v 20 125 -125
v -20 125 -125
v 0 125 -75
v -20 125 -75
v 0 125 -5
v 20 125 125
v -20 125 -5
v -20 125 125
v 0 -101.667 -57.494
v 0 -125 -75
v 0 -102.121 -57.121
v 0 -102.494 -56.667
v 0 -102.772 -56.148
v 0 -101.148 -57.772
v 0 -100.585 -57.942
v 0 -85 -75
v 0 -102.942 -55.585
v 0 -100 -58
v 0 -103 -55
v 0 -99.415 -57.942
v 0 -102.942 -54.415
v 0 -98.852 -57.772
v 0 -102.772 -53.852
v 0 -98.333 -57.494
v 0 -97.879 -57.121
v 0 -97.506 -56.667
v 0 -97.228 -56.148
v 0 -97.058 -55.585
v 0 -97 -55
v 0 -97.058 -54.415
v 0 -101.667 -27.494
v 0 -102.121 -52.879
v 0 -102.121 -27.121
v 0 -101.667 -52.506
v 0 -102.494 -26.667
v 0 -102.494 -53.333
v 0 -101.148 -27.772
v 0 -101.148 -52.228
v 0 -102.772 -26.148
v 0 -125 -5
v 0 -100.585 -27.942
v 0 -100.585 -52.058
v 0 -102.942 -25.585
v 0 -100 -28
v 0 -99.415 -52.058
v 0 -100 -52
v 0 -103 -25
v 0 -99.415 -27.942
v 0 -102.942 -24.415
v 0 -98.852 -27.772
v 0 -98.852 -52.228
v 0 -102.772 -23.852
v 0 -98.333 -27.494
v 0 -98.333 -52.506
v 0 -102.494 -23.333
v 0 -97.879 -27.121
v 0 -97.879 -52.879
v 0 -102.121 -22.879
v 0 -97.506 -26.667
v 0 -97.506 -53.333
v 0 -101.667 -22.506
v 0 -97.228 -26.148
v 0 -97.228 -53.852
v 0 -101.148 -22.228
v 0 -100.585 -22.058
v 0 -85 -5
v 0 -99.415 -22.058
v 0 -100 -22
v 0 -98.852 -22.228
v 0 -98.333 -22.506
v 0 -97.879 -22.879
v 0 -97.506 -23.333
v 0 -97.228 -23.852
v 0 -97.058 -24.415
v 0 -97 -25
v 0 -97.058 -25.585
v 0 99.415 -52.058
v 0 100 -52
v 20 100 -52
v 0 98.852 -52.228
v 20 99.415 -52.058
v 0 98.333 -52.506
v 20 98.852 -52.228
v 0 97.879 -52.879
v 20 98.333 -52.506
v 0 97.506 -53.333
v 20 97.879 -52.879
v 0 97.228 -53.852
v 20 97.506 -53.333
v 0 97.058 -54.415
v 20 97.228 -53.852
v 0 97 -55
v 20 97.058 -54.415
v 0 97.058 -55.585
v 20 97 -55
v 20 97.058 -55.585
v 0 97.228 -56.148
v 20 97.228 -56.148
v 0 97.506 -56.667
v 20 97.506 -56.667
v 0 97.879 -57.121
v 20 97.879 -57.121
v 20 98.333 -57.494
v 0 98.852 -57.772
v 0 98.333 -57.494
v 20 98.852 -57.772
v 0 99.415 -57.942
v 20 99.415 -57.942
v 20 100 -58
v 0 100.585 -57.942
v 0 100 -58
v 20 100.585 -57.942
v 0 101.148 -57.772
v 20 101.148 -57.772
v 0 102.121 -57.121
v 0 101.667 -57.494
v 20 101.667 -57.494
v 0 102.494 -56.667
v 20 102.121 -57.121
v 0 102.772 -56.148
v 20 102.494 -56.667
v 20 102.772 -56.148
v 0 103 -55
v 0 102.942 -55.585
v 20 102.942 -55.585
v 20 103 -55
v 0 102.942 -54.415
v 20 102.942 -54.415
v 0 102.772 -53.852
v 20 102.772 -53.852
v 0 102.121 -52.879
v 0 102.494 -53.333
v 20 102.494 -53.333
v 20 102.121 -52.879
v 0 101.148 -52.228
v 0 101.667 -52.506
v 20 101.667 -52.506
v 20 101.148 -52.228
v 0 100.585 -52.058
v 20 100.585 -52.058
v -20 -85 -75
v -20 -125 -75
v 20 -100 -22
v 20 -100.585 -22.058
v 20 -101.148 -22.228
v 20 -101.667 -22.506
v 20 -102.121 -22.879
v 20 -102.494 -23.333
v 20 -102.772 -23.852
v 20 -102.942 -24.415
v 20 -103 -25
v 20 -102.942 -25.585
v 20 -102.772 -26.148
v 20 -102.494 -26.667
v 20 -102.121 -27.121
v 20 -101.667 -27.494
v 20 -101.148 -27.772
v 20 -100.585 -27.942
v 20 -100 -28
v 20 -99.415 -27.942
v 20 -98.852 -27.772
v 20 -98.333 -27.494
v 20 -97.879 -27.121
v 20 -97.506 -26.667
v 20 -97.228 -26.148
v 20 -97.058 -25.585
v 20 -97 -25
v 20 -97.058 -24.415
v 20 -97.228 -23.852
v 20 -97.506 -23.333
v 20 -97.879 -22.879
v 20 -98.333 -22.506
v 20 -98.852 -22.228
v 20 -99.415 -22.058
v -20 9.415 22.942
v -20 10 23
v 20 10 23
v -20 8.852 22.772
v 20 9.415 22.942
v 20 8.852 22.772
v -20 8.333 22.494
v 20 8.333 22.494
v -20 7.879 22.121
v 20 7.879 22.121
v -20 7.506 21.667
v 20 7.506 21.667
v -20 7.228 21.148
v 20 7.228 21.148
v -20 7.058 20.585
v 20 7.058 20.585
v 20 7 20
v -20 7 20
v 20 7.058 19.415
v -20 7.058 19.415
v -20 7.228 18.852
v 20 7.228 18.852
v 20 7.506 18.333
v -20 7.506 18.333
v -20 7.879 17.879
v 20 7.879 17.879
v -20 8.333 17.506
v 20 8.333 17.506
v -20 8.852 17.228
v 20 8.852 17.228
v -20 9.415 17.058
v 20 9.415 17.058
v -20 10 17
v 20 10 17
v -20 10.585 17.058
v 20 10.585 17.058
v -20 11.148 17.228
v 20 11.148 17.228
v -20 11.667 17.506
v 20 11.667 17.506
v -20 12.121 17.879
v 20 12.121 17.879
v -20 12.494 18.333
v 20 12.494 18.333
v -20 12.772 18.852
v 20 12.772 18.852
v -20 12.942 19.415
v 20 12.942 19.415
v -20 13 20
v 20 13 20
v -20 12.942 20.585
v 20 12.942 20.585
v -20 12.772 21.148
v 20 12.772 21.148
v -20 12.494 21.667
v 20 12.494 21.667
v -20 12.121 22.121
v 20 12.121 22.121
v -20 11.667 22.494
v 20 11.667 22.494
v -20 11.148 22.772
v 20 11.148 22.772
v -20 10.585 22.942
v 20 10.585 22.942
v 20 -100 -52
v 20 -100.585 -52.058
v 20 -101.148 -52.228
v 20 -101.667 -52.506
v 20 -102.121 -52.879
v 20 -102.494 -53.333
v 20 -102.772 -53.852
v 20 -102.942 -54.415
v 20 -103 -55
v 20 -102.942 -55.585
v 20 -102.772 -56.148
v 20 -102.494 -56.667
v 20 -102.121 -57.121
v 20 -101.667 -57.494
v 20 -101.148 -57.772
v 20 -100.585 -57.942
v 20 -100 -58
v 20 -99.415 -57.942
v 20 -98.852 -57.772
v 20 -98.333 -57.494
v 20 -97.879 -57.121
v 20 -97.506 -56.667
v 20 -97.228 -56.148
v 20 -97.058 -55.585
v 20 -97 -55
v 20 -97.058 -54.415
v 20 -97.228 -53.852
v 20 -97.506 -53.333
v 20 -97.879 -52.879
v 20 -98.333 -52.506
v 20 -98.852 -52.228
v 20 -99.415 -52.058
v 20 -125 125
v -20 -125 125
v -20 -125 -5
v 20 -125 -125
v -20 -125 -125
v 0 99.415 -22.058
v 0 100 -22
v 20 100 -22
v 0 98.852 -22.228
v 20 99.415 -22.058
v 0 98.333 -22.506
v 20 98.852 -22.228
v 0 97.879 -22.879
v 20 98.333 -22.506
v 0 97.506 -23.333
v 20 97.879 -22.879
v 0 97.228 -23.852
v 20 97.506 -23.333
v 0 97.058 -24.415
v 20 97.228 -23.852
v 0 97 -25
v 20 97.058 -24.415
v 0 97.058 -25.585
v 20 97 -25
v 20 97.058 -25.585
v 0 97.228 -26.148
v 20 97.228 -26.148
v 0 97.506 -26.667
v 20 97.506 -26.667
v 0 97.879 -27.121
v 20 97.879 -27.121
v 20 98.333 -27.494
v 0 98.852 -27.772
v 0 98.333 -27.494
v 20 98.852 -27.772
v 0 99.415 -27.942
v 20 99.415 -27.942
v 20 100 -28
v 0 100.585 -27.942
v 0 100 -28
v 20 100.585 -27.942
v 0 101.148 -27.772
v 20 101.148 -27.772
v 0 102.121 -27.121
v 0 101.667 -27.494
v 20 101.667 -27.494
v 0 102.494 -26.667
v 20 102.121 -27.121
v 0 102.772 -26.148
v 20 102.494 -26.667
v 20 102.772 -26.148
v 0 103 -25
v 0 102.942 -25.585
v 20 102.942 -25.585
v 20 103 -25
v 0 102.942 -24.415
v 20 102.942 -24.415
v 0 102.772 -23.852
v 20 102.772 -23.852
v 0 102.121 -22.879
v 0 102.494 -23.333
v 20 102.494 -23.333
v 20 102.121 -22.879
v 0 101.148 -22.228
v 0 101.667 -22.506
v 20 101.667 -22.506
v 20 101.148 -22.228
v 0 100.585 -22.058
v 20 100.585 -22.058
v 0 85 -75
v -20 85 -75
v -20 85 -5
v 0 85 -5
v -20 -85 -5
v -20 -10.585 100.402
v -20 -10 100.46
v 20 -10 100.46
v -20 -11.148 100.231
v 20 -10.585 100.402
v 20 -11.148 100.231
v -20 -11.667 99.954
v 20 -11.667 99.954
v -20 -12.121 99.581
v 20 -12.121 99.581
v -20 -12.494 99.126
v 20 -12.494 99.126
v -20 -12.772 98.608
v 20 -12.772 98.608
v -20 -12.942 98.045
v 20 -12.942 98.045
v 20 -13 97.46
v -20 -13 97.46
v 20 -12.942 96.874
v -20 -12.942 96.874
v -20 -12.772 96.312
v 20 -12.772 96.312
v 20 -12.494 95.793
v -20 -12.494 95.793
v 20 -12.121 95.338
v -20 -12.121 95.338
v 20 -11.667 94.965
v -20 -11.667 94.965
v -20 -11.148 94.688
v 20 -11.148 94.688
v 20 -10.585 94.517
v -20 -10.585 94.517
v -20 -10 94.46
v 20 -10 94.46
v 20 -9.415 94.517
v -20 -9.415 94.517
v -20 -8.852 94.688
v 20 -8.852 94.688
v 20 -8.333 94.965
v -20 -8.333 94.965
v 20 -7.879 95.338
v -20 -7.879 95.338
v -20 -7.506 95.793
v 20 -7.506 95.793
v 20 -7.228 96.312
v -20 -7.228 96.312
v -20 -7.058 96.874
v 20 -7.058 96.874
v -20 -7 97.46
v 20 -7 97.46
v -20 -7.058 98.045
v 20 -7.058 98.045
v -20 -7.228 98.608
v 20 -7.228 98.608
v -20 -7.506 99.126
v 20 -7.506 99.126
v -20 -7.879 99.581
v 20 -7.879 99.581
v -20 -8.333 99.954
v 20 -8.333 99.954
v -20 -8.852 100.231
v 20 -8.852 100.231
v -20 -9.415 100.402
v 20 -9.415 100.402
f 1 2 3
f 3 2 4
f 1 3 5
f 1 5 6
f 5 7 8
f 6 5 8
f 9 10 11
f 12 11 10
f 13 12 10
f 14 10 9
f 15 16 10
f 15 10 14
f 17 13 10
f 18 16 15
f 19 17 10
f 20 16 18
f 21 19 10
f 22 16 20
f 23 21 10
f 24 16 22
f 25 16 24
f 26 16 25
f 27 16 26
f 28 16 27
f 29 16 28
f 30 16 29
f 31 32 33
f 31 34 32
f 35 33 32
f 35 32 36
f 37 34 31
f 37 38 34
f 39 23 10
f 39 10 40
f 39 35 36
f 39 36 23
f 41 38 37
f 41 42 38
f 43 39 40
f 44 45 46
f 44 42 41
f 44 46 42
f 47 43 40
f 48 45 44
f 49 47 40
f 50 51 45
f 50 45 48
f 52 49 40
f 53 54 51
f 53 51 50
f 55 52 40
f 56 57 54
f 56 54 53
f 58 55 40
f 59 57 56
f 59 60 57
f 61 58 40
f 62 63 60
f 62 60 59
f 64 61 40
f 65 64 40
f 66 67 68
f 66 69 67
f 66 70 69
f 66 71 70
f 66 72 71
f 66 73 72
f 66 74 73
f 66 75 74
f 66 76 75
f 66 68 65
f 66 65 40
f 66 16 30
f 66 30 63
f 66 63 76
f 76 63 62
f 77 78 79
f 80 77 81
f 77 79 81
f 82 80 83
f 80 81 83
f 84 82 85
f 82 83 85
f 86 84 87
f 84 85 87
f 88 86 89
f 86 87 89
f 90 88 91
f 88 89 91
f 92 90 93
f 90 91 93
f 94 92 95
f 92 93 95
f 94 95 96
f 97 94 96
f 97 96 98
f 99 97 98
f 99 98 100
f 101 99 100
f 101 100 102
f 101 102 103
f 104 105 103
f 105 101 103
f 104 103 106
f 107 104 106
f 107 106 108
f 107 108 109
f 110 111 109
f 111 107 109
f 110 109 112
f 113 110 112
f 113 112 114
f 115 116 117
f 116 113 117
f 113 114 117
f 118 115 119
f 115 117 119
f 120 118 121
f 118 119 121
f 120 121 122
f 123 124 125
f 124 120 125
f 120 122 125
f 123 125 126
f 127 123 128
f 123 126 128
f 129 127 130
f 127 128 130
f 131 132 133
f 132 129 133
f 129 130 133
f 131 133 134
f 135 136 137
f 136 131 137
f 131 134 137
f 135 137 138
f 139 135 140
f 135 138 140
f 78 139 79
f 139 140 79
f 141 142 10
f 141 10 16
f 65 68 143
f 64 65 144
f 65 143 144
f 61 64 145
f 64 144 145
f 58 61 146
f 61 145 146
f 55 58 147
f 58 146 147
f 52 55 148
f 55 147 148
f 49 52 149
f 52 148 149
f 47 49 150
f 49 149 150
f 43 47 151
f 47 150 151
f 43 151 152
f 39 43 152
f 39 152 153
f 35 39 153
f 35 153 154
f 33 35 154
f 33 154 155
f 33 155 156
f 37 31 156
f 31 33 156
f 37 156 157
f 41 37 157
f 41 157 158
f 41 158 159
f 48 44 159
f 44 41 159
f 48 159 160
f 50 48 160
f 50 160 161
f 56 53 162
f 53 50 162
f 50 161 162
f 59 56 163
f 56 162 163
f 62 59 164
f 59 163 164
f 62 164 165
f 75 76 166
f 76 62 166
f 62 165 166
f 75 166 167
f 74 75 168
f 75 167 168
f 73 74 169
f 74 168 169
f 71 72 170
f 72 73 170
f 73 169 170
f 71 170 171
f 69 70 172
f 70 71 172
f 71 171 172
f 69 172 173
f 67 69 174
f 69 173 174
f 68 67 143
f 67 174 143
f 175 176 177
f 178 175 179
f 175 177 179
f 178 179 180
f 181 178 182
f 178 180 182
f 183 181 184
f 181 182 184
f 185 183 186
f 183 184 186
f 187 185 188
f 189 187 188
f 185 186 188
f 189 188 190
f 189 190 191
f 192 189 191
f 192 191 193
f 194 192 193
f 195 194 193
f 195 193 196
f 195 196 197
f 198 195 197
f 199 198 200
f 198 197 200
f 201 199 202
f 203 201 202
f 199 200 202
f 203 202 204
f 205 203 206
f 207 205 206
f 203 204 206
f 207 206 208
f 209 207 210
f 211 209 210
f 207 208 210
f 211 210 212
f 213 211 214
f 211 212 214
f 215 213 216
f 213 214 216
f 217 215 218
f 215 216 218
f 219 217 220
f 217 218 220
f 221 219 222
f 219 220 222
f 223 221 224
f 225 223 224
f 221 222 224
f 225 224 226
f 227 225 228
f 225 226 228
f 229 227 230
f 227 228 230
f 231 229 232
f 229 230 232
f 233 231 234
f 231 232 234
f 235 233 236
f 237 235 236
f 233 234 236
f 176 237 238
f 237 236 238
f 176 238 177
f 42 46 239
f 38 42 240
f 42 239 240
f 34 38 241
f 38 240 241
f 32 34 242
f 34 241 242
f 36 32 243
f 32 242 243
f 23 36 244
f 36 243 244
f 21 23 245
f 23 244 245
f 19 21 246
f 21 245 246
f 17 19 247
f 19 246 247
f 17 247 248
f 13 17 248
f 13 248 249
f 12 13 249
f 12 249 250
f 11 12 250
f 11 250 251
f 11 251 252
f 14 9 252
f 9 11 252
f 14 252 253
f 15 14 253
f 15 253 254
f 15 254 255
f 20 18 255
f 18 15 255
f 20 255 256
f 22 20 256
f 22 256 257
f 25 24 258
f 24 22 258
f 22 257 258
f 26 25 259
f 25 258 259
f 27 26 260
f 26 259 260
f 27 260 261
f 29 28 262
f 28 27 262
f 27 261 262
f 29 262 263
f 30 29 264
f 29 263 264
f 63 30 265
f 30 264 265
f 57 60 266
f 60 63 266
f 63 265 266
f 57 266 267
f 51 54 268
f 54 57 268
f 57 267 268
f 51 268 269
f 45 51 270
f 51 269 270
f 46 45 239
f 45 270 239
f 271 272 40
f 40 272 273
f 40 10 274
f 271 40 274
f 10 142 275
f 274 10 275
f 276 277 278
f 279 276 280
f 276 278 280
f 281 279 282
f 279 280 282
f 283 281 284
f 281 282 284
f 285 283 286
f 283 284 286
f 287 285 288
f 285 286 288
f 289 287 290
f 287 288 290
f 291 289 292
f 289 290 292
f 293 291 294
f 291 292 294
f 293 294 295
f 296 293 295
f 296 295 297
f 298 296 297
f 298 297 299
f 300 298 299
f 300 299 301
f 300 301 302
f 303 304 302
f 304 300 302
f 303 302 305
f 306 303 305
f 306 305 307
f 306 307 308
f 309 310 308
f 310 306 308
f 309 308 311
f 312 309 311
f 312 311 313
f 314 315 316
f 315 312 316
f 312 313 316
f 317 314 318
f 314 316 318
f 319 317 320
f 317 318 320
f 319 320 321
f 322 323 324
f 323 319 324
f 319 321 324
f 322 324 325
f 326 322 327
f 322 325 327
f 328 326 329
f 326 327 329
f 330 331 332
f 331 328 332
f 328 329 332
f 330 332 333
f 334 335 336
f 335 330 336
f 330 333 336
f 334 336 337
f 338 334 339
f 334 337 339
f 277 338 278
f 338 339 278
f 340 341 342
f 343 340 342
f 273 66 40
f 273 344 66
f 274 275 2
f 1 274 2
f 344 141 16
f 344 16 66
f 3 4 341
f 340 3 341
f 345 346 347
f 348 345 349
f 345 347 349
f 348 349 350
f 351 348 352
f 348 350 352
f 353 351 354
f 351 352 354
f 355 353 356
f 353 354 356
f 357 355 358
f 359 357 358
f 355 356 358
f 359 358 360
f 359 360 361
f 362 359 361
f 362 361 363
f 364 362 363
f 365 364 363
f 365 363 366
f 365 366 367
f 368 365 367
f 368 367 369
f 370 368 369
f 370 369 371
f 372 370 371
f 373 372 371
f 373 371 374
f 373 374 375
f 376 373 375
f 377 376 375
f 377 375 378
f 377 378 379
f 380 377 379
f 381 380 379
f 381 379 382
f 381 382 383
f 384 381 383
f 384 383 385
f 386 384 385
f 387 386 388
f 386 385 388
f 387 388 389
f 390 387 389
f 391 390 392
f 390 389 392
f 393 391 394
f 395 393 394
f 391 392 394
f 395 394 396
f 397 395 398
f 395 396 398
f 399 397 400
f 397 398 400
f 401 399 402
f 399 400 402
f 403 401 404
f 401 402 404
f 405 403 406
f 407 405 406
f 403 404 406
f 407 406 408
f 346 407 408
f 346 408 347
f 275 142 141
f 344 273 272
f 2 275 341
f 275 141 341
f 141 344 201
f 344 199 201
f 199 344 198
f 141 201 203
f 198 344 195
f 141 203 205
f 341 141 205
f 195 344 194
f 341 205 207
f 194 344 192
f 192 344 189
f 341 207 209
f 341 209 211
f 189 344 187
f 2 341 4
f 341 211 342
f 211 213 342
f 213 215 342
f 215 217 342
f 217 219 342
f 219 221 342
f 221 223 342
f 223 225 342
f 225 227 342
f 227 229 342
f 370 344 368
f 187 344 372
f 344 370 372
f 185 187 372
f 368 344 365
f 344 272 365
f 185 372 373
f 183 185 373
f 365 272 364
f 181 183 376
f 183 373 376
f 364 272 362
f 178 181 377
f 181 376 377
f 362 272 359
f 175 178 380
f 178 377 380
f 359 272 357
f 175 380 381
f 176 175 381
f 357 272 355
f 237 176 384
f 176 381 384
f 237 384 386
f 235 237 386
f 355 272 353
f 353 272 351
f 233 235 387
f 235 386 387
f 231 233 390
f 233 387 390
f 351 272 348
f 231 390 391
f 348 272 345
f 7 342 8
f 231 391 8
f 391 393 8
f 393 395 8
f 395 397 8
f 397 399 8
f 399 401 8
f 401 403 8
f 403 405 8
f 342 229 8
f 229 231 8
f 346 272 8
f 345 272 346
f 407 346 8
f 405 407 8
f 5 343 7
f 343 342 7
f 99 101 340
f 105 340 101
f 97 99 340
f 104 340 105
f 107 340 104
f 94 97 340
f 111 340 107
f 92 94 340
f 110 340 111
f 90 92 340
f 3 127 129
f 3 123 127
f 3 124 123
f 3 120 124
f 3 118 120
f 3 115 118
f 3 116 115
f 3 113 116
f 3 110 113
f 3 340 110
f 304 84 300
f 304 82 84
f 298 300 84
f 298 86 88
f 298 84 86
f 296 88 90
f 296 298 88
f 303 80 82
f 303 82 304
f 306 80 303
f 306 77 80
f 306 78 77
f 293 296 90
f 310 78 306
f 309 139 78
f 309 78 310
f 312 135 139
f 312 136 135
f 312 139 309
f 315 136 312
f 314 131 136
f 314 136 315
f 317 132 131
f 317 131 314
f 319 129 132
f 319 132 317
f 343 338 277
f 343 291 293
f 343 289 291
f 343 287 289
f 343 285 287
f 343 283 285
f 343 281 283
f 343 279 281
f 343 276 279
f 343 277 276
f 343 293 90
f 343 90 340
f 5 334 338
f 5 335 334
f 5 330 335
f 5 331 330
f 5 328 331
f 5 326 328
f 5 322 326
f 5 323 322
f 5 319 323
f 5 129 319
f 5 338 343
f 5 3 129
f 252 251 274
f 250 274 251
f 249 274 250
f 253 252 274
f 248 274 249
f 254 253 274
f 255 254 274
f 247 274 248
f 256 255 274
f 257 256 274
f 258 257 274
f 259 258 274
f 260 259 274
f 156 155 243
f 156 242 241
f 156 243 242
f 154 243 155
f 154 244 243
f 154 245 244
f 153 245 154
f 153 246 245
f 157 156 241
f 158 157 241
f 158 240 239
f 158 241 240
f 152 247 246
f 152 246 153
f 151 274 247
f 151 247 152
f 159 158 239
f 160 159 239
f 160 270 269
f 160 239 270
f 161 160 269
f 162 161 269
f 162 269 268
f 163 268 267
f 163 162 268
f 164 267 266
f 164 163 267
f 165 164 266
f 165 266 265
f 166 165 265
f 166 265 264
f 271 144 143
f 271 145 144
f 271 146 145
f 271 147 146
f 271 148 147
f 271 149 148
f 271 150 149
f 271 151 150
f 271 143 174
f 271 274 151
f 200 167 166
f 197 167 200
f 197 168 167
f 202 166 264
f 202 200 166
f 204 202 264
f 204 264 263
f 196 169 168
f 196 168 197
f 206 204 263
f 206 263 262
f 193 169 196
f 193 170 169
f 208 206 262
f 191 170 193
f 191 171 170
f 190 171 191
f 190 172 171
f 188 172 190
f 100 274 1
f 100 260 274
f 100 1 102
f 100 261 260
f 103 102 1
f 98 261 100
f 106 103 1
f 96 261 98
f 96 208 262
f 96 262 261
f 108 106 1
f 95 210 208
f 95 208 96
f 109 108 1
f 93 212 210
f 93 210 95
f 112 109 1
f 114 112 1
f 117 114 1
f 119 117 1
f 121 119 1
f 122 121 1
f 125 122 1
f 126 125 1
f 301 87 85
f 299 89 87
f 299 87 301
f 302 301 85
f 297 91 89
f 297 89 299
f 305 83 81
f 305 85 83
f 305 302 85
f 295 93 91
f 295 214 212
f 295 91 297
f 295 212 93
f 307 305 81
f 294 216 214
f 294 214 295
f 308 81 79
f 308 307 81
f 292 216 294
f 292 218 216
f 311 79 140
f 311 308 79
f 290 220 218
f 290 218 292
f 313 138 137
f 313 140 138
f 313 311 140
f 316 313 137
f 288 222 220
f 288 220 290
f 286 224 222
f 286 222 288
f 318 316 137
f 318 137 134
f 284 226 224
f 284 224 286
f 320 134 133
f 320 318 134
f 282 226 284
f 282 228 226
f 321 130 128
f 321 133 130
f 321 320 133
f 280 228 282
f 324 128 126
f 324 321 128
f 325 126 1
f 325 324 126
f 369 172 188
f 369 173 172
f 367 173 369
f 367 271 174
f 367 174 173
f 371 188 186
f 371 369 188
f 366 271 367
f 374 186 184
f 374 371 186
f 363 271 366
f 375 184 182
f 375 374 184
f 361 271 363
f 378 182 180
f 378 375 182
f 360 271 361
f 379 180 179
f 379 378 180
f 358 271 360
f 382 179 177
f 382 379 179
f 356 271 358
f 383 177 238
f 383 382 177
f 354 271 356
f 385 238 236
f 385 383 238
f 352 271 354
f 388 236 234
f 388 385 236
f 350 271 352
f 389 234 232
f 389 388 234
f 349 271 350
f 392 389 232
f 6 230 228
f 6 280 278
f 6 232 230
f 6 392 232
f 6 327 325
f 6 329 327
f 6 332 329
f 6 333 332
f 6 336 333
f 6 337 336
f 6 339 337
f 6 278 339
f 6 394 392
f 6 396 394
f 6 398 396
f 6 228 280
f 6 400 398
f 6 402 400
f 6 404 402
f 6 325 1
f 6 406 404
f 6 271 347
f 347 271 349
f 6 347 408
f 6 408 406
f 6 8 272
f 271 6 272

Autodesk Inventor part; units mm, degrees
ref_plane "YZ Plane" through (0, 0, 0) normal (1, 0, 0) x (0, 1, 0)
ref_plane "XY Plane" through (0, 0, 0) normal (0, 0, 1) x (1, 0, 0)
sketch "Sketch1" plane through (0, 0, 0) normal (1, 0, 0) x (0, 1, 0)
  line L0 (0, 175) -> (0, -175) construction
  line L1 (-175, 0) -> (175, 0) construction
  line L2 (125, 125) -> (-125, 125)
  line L3 (-125, 125) -> (-125, -125)
  line L4 (-125, -125) -> (125, -125)
  line L5 (125, -125) -> (125, 125)
  point P0 (0, 0)
  dimension "d0" = 250
  dimension "d1" = 250
extrude "Main_Body" add sketch "Sketch1" along normal mid plane 40
sketch "Sketch4" plane through (-20, 0, 0) normal (-1, 0, 0) x (0, 0, 1)
  line L0 (-175, 0) -> (175, 0) construction
  line L1 (0, 175) -> (0, -175) construction
  line L2 (-55, 100) -> (-25, 100) construction
  line L3 (-55, -100) -> (-25, -100) construction
  line L4 (-40, 100) -> (-40, -100) construction
  line L5 (20, 10) -> (97.4597, -10) construction
  point P0 (0, 0)
  dimension "d10" = 30
  dimension "d12" = 40
  dimension "d13" = 200
  dimension "d21" = 80
  dimension "d22" = 60
  dimension "d23" = 10
  dimension "d24" = 10
hole "Hole1" at (-20, 100, -55) at (-20, 100, -25) at (-20, -100, -55) at (-20, -100, -25) at (-20, 10, 20) at (-20, -10, 97.4597) direction (1, 0, 0) diameter 6 end through all
sketch "Sketch5" plane through (-20, 0, 0) normal (-1, 0, 0) x (0, 0, 1)
  line L0 (125, 125) -> (-125, 125) projected
  line L1 (-75, 125) -> (-75, 85)
  line L2 (-75, 85) -> (-5, 85)
  line L3 (-5, 85) -> (-5, 125)
  line L4 (-40, 100) -> (-40, -100) construction
  line L5 (-175, 0) -> (175, 0) construction
  line L6 (-75, -125) -> (-75, -85)
  line L7 (-75, -85) -> (-5, -85)
  line L8 (-5, -85) -> (-5, -125)
  line L9 (-125, -125) -> (125, -125) projected
  circle A0 centre (-55, 100) radius 3 projected
  circle A1 centre (-25, 100) radius 3 projected
  circle A2 centre (-55, -100) radius 3 projected
  circle A3 centre (-25, -100) radius 3 projected
  point P0 (0, 0)
  dimension "d32" = 40
  dimension "d33" = 70
extrude "L: Rock End Bracket Pocket" cut sketch "Sketch5" against normal up to surface (20 mm away)
sketch "Sketch8" plane through (20, 0, 0) normal (1, 0, 0) x (0, 0, -1)
  line L0 (40, 100) -> (40, -100) construction
  line L1 (-125, 125) -> (125, 125) projected
  line L2 (9.0545, 125) -> (9.0545, 85.102)
  line L3 (9.0545, 85.102) -> (70.9455, 85.102)
  line L4 (70.9455, 85.102) -> (70.9455, 125)
  line L5 (-175, 0) -> (175, 0) construction
  line L6 (9.0545, -125) -> (9.0545, -85.102)
  line L7 (9.0545, -85.102) -> (70.9455, -85.102)
  line L8 (70.9455, -85.102) -> (70.9455, -125)
  line L9 (-125, -125) -> (125, -125) projected
  circle A0 centre (25, 100) radius 3 projected
  circle A1 centre (55, 100) radius 3 projected
  circle A2 centre (25, -100) radius 3 projected
  circle A3 centre (55, -100) radius 3 projected
  point P0 (0, 0)
  dimension "d48" = 61.891
  dimension "d49" = 39.898
extrude "R: Rod End Bracket Pocket" [suppressed]
sketch "Sketch9" plane through (-20, 0, 0) normal (-1, 0, 0) x (0, 0, 1)
  line L0 (-40, 100) -> (-40, -100) construction
  line L1 (-175, 0) -> (175, 0) construction
  circle A0 centre (-40, 0) radius 28.5745
  point P0 (0, 0)
  dimension "d52" = 57.149
extrude "Axle Bore" [suppressed]
sketch "Sketch10" plane through (-20, 0, 0) normal (-1, 0, 0) x (0, 0, 1)
  circle A0 centre (-40, 0) radius 27.5 projected
  circle A1 centre (-40, 0) radius 37.9265
  point P0 (0, 0)
  dimension "d55" = 75.853
extrude "Bearing Pocket 1" [suppressed]
sketch "Sketch11" plane through (20, 0, 0) normal (1, 0, 0) x (0, 0, -1)
  circle A0 centre (40, 0) radius 27.5 projected
  circle A1 centre (40, 0) radius 38.383
  point P0 (0, 0)
  dimension "d58" = 76.766
extrude "Bearing Pocket 2" [suppressed]
ref_plane "Work Plane1" through (-20, 125, -125) normal (0, 1, 0) x (-1, 0, 0)
sketch "Sketch12" plane through (-20, 125, -125) normal (0, 1, 0) x (-1, 0, 0)
  line L0 (-20, -50) -> (-20, 300) construction
  line L1 (-48, 125) -> (8, 125) construction
  point P0 (-20, 125)
  point P1 (0, 85)
  point P2 (0, 85)
  point P3 (0, 85)
  point P4 (-20, 20.88)
  dimension "d61" = 64.12
hole "Hole4" [suppressed]
sketch "Sketch13" plane through (20, 125, -125) normal (0, 0, -1) x (-1, 0, 0)
  line L0 (20, -300) -> (20, 50) construction
  line L1 (-8, -125) -> (48, -125) construction
  line L2 (40, -203.192) -> (0, -203.192)
  line L3 (0, -203.192) -> (0, -230.998)
  line L4 (0, -230.998) -> (40, -230.998)
  line L5 (40, -230.998) -> (40, -203.192)
  line L6 (0, -217.095) -> (40, -217.095) construction
  line L7 (0, -250) -> (0, 0) projected
  line L8 (40, 0) -> (40, -250) projected
  point P0 (20, -125)
  dimension "d69" = 92.095
  dimension "d70" = 27.806
extrude "Extrusion9" [suppressed]
equation "\"d32\" = Rod_End_Bracket_Slot_Height"
equation "\"d33\" = Rod_End_Bracket_Slot_Width"
equation "\"Rod_End_Bracket_Slot_Height\" = 40"
equation "\"Rod_End_Bracket_Slot_Width\" = 70"
properties part number "Suspension_Upright_V2_Topology_Baseline_V1"
